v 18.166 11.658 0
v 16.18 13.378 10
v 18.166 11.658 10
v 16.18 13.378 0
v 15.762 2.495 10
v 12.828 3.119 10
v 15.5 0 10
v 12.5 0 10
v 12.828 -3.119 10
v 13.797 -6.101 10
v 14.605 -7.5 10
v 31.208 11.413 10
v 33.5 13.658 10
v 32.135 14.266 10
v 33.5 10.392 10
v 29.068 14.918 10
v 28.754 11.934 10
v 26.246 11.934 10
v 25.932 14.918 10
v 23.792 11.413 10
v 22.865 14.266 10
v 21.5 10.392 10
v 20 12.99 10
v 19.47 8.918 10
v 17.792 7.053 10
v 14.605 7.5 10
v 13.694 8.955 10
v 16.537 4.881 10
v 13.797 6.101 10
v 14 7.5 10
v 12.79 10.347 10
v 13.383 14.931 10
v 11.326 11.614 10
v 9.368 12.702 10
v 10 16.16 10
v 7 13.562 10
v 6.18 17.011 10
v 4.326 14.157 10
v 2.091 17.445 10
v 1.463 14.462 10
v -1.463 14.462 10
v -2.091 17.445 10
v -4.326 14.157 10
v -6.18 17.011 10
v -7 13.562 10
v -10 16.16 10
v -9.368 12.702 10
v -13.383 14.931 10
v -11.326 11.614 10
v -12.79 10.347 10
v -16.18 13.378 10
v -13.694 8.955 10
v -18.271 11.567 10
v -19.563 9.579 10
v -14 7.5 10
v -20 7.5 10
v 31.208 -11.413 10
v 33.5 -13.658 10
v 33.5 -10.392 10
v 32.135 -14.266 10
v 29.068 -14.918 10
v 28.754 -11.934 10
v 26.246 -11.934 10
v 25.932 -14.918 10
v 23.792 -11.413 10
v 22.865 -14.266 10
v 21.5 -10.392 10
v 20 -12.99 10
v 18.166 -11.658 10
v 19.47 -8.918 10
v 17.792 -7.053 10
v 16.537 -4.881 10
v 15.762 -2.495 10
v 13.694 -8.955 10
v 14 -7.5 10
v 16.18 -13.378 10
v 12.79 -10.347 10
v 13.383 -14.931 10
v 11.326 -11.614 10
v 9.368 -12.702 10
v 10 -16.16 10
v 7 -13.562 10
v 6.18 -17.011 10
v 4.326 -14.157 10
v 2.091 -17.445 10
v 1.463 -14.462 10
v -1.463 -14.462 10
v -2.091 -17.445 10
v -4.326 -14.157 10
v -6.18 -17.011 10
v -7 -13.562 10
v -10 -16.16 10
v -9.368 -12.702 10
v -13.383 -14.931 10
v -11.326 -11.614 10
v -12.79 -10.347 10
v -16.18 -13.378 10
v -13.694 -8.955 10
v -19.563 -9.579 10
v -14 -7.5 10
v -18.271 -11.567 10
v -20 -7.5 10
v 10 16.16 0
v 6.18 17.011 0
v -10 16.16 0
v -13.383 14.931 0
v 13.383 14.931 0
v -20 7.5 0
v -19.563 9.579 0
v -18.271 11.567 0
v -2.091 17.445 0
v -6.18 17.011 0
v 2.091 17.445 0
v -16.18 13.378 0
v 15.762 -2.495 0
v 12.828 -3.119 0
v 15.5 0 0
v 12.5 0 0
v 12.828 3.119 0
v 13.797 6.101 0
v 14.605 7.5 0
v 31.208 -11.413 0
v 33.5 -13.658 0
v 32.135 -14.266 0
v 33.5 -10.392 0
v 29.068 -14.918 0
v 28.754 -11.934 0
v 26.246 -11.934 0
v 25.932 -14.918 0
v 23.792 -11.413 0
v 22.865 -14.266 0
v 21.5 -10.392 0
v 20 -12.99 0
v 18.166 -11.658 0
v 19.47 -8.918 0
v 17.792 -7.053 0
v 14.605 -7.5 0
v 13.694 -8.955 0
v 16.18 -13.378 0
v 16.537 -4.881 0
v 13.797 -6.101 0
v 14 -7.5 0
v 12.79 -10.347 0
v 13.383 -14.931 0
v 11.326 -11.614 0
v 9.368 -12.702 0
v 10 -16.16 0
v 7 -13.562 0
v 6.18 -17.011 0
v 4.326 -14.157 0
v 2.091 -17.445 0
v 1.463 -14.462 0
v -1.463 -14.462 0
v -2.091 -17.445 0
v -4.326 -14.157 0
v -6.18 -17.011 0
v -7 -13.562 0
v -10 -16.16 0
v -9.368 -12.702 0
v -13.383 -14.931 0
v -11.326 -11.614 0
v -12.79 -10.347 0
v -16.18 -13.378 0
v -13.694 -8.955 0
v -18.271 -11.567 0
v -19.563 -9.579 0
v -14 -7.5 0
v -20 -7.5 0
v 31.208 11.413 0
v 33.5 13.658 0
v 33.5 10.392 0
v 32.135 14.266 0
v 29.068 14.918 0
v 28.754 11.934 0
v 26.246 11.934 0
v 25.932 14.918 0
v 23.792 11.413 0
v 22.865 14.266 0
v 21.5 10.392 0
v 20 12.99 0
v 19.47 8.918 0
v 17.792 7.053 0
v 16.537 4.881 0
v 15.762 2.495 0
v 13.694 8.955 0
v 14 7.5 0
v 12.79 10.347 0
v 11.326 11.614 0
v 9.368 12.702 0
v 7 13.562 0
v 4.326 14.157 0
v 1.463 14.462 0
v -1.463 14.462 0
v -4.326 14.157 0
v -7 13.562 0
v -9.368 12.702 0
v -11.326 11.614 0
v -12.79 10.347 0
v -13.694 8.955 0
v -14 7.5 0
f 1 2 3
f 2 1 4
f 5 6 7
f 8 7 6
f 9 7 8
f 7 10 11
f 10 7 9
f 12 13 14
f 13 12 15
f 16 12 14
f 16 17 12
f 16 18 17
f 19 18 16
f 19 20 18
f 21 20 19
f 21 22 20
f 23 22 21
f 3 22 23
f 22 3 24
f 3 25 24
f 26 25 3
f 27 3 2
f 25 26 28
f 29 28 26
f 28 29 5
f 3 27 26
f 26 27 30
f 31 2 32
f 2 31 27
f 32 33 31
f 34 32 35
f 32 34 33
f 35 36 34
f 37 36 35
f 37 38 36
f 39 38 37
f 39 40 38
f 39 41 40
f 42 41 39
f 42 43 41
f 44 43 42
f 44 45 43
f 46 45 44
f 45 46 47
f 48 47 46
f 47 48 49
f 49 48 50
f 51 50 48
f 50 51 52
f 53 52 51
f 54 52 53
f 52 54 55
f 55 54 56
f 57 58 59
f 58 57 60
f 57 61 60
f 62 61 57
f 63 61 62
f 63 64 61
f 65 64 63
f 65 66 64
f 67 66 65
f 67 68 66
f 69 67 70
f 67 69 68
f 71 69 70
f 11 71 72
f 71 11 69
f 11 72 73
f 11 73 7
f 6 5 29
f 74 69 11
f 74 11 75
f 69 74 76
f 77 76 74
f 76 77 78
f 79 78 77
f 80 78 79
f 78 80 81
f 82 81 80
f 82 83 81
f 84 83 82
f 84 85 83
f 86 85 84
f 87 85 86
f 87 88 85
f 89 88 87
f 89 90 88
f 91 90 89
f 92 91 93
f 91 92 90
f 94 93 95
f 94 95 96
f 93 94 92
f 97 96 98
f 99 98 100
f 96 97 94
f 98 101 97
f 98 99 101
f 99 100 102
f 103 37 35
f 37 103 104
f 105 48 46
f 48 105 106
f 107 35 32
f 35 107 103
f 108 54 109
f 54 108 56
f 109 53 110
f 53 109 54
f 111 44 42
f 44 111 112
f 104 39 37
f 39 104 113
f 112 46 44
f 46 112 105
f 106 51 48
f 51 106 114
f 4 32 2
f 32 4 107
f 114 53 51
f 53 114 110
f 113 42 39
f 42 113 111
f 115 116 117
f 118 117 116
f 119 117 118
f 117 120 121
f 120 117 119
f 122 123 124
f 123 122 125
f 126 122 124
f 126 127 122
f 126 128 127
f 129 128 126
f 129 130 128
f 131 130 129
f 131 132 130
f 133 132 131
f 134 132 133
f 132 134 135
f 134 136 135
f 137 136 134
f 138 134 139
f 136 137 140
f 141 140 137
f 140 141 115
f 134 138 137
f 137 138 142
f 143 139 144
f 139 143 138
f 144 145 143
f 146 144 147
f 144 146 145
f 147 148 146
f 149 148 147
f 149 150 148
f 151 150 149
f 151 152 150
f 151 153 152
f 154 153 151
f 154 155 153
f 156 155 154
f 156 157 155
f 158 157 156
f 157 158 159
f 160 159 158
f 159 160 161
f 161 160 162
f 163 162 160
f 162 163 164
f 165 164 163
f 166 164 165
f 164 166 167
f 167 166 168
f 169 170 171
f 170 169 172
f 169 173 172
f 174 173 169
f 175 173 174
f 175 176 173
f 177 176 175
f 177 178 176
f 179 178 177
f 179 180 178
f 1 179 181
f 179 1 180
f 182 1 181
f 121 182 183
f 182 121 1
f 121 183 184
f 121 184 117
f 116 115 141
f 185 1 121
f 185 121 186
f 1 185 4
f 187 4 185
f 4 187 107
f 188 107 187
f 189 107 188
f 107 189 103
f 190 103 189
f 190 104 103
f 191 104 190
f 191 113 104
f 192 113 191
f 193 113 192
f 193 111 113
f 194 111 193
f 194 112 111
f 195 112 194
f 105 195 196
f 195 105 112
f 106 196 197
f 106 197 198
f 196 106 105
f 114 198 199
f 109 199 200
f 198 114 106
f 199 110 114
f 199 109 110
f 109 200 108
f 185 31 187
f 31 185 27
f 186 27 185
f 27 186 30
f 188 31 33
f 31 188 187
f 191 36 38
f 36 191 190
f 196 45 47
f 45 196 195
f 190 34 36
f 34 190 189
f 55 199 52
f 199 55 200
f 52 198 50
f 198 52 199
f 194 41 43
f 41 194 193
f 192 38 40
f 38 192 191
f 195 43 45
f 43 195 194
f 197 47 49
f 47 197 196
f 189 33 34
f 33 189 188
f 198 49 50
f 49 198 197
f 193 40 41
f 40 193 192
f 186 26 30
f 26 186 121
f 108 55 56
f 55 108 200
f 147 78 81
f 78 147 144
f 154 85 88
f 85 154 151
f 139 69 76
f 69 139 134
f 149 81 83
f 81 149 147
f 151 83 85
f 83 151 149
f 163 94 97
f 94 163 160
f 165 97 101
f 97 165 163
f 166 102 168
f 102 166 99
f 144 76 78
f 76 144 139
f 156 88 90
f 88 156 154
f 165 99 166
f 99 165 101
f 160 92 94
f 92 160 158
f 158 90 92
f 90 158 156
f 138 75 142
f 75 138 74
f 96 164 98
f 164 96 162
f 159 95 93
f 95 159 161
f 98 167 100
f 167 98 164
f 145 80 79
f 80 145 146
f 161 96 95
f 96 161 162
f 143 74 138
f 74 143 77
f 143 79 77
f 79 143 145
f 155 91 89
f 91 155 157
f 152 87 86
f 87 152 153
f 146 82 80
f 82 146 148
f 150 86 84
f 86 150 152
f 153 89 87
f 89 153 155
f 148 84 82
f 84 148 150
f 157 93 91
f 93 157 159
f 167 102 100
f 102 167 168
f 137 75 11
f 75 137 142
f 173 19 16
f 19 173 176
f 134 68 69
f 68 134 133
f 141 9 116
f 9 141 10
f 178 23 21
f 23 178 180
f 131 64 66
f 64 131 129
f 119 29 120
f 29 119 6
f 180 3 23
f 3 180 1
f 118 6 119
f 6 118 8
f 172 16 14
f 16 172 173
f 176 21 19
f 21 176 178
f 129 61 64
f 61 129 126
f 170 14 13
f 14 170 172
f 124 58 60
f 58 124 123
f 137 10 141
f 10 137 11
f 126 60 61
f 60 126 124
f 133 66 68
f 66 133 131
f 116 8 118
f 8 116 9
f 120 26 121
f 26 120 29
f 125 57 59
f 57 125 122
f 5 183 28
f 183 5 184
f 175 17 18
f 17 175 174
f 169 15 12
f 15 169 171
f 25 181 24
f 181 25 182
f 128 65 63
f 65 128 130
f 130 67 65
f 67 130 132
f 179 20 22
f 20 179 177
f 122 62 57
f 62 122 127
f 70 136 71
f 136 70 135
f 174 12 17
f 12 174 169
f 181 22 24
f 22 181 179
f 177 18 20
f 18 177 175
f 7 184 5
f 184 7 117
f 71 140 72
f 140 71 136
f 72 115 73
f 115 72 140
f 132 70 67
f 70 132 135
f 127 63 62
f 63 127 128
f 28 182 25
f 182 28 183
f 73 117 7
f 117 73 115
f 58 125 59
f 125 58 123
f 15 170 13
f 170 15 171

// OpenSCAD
// [FL_INDEX: keywords="openscad, 3d_parametric, Simple_Clip, csg_solid" | COT="Parametric OpenSCAD design from 3DCodeverse"]
// Title: Simple Clip

BendRaduis=20;
height=10;
thickness=3;
Gap=15;

module TopJaw(){
	scale([1,.5,1])difference(){
		cylinder(r=BendRaduis,h=height);
		cylinder(r=BendRaduis-thickness*2,h=height);
		translate([-BendRaduis,0,-height])cube([BendRaduis*3,BendRaduis*3,height*3]);
	}
}
module BottomJaw(){
	difference(){
		scale([1,.5,1])cylinder(r=BendRaduis,h=height);
		scale([1,.5,1])cylinder(r=BendRaduis-thickness*2,h=height);
		translate([-BendRaduis,-BendRaduis*3,-height])cube([BendRaduis*3,BendRaduis*3,height*3]);
	}
}
module clip(){
	difference(){
		union(){
			translate([0,Gap/2,0])BottomJaw();
			translate([0,-Gap/2,0])TopJaw();
			translate([BendRaduis+Gap/2,0,0])cylinder(r=.75*BendRaduis,h=height);
		}
			
		translate([BendRaduis+Gap/2,0,0])cylinder(r=.75*BendRaduis-thickness,h=height);
		translate([1.3*BendRaduis+Gap/2,-BendRaduis*2,-height])cube([BendRaduis*4,BendRaduis*4,height*3]);

	}
}
clip();
